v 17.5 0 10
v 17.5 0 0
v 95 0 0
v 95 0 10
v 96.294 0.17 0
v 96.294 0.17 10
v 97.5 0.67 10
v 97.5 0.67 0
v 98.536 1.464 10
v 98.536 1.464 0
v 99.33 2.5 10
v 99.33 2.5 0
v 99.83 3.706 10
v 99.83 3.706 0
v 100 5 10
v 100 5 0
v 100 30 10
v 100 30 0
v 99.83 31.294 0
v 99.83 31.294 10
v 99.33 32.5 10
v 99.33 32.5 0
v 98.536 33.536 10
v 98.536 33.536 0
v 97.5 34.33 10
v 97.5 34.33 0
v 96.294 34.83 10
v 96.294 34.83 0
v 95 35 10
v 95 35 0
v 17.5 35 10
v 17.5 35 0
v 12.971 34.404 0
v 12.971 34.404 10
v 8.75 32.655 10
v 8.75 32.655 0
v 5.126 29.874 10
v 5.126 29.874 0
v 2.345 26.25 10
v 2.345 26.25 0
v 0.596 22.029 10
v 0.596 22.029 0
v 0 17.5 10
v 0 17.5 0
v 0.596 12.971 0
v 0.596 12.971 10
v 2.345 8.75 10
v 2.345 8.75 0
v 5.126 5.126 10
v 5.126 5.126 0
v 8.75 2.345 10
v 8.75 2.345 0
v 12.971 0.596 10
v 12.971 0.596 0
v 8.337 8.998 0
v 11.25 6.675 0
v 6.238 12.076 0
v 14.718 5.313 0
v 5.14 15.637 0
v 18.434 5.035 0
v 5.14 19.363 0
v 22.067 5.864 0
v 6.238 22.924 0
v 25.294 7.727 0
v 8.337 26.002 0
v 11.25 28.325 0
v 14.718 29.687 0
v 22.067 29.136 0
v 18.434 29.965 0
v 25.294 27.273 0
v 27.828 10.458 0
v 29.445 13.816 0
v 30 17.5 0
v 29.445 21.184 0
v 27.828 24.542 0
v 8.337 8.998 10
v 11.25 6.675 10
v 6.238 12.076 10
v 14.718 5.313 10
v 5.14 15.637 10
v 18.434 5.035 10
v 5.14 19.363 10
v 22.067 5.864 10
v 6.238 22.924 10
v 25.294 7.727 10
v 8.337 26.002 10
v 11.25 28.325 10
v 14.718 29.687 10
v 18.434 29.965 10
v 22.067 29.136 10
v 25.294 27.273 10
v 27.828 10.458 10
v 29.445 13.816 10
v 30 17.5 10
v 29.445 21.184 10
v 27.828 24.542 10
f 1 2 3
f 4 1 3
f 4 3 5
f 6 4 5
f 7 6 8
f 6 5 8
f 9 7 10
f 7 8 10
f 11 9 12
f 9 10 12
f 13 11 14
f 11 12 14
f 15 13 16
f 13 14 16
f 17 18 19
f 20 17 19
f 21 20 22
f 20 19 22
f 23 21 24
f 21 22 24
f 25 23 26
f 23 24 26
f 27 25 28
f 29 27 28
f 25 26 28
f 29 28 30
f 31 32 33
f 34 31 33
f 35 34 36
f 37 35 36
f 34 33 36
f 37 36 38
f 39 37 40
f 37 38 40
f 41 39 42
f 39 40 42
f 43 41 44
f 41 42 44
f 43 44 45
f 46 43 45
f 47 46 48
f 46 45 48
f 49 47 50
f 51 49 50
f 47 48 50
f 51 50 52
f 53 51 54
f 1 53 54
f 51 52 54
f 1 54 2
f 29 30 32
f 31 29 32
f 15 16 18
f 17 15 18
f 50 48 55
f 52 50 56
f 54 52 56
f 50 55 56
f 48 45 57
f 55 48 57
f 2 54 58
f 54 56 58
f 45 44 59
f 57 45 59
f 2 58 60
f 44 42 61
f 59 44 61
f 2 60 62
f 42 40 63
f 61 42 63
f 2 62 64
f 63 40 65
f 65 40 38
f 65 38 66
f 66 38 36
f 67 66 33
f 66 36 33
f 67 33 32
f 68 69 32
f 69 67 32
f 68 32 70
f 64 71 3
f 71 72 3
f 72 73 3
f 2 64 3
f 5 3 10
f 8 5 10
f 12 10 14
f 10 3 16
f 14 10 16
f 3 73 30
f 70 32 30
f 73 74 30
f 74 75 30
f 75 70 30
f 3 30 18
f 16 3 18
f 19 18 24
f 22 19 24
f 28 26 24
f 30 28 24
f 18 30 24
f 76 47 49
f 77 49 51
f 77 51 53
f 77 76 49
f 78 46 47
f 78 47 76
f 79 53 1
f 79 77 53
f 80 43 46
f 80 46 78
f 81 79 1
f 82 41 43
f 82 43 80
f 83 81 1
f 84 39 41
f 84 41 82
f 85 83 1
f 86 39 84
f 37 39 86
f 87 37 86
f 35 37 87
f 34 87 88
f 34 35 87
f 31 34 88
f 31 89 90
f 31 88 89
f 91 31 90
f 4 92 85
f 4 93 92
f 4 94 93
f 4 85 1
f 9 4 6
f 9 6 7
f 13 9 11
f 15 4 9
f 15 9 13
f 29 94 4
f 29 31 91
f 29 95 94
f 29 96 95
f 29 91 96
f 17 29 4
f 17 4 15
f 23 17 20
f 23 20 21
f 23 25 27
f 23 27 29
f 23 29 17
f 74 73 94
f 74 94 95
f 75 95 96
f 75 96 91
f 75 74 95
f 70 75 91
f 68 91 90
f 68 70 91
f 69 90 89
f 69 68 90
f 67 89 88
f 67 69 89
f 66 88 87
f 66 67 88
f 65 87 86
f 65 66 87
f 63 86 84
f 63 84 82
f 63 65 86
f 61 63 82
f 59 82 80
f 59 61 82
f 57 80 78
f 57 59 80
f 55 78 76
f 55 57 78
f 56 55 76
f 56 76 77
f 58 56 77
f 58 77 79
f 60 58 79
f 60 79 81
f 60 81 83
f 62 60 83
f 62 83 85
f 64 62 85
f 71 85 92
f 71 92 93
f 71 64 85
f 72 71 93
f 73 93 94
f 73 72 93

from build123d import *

# Parameters (mm, degrees)
F0_R     = 12.5
F1_DEPTH = 10


with BuildPart() as f1:
    # F0 (on Top) → F1 (new body)
    with BuildSketch(Plane.XY):
        with BuildLine():
            ThreePointArc((0, 17.5), (5.125631, 5.125631), (17.5, 0))
            Line((17.5, 0), (95, 0))
            ThreePointArc((95, 0), (98.535534, 1.464466), (100, 5))
            Line((100, 5), (100, 30))
            ThreePointArc((100, 30), (98.535534, 33.535534), (95, 35))
            Line((95, 35), (17.5, 35))
            ThreePointArc((17.5, 35), (5.125631, 29.874369), (0, 17.5))
        make_face()
        with Locations((17.5, 17.5)):
            Circle(F0_R, mode=Mode.SUBTRACT)
    extrude(amount=F1_DEPTH)


solid = f1.part
